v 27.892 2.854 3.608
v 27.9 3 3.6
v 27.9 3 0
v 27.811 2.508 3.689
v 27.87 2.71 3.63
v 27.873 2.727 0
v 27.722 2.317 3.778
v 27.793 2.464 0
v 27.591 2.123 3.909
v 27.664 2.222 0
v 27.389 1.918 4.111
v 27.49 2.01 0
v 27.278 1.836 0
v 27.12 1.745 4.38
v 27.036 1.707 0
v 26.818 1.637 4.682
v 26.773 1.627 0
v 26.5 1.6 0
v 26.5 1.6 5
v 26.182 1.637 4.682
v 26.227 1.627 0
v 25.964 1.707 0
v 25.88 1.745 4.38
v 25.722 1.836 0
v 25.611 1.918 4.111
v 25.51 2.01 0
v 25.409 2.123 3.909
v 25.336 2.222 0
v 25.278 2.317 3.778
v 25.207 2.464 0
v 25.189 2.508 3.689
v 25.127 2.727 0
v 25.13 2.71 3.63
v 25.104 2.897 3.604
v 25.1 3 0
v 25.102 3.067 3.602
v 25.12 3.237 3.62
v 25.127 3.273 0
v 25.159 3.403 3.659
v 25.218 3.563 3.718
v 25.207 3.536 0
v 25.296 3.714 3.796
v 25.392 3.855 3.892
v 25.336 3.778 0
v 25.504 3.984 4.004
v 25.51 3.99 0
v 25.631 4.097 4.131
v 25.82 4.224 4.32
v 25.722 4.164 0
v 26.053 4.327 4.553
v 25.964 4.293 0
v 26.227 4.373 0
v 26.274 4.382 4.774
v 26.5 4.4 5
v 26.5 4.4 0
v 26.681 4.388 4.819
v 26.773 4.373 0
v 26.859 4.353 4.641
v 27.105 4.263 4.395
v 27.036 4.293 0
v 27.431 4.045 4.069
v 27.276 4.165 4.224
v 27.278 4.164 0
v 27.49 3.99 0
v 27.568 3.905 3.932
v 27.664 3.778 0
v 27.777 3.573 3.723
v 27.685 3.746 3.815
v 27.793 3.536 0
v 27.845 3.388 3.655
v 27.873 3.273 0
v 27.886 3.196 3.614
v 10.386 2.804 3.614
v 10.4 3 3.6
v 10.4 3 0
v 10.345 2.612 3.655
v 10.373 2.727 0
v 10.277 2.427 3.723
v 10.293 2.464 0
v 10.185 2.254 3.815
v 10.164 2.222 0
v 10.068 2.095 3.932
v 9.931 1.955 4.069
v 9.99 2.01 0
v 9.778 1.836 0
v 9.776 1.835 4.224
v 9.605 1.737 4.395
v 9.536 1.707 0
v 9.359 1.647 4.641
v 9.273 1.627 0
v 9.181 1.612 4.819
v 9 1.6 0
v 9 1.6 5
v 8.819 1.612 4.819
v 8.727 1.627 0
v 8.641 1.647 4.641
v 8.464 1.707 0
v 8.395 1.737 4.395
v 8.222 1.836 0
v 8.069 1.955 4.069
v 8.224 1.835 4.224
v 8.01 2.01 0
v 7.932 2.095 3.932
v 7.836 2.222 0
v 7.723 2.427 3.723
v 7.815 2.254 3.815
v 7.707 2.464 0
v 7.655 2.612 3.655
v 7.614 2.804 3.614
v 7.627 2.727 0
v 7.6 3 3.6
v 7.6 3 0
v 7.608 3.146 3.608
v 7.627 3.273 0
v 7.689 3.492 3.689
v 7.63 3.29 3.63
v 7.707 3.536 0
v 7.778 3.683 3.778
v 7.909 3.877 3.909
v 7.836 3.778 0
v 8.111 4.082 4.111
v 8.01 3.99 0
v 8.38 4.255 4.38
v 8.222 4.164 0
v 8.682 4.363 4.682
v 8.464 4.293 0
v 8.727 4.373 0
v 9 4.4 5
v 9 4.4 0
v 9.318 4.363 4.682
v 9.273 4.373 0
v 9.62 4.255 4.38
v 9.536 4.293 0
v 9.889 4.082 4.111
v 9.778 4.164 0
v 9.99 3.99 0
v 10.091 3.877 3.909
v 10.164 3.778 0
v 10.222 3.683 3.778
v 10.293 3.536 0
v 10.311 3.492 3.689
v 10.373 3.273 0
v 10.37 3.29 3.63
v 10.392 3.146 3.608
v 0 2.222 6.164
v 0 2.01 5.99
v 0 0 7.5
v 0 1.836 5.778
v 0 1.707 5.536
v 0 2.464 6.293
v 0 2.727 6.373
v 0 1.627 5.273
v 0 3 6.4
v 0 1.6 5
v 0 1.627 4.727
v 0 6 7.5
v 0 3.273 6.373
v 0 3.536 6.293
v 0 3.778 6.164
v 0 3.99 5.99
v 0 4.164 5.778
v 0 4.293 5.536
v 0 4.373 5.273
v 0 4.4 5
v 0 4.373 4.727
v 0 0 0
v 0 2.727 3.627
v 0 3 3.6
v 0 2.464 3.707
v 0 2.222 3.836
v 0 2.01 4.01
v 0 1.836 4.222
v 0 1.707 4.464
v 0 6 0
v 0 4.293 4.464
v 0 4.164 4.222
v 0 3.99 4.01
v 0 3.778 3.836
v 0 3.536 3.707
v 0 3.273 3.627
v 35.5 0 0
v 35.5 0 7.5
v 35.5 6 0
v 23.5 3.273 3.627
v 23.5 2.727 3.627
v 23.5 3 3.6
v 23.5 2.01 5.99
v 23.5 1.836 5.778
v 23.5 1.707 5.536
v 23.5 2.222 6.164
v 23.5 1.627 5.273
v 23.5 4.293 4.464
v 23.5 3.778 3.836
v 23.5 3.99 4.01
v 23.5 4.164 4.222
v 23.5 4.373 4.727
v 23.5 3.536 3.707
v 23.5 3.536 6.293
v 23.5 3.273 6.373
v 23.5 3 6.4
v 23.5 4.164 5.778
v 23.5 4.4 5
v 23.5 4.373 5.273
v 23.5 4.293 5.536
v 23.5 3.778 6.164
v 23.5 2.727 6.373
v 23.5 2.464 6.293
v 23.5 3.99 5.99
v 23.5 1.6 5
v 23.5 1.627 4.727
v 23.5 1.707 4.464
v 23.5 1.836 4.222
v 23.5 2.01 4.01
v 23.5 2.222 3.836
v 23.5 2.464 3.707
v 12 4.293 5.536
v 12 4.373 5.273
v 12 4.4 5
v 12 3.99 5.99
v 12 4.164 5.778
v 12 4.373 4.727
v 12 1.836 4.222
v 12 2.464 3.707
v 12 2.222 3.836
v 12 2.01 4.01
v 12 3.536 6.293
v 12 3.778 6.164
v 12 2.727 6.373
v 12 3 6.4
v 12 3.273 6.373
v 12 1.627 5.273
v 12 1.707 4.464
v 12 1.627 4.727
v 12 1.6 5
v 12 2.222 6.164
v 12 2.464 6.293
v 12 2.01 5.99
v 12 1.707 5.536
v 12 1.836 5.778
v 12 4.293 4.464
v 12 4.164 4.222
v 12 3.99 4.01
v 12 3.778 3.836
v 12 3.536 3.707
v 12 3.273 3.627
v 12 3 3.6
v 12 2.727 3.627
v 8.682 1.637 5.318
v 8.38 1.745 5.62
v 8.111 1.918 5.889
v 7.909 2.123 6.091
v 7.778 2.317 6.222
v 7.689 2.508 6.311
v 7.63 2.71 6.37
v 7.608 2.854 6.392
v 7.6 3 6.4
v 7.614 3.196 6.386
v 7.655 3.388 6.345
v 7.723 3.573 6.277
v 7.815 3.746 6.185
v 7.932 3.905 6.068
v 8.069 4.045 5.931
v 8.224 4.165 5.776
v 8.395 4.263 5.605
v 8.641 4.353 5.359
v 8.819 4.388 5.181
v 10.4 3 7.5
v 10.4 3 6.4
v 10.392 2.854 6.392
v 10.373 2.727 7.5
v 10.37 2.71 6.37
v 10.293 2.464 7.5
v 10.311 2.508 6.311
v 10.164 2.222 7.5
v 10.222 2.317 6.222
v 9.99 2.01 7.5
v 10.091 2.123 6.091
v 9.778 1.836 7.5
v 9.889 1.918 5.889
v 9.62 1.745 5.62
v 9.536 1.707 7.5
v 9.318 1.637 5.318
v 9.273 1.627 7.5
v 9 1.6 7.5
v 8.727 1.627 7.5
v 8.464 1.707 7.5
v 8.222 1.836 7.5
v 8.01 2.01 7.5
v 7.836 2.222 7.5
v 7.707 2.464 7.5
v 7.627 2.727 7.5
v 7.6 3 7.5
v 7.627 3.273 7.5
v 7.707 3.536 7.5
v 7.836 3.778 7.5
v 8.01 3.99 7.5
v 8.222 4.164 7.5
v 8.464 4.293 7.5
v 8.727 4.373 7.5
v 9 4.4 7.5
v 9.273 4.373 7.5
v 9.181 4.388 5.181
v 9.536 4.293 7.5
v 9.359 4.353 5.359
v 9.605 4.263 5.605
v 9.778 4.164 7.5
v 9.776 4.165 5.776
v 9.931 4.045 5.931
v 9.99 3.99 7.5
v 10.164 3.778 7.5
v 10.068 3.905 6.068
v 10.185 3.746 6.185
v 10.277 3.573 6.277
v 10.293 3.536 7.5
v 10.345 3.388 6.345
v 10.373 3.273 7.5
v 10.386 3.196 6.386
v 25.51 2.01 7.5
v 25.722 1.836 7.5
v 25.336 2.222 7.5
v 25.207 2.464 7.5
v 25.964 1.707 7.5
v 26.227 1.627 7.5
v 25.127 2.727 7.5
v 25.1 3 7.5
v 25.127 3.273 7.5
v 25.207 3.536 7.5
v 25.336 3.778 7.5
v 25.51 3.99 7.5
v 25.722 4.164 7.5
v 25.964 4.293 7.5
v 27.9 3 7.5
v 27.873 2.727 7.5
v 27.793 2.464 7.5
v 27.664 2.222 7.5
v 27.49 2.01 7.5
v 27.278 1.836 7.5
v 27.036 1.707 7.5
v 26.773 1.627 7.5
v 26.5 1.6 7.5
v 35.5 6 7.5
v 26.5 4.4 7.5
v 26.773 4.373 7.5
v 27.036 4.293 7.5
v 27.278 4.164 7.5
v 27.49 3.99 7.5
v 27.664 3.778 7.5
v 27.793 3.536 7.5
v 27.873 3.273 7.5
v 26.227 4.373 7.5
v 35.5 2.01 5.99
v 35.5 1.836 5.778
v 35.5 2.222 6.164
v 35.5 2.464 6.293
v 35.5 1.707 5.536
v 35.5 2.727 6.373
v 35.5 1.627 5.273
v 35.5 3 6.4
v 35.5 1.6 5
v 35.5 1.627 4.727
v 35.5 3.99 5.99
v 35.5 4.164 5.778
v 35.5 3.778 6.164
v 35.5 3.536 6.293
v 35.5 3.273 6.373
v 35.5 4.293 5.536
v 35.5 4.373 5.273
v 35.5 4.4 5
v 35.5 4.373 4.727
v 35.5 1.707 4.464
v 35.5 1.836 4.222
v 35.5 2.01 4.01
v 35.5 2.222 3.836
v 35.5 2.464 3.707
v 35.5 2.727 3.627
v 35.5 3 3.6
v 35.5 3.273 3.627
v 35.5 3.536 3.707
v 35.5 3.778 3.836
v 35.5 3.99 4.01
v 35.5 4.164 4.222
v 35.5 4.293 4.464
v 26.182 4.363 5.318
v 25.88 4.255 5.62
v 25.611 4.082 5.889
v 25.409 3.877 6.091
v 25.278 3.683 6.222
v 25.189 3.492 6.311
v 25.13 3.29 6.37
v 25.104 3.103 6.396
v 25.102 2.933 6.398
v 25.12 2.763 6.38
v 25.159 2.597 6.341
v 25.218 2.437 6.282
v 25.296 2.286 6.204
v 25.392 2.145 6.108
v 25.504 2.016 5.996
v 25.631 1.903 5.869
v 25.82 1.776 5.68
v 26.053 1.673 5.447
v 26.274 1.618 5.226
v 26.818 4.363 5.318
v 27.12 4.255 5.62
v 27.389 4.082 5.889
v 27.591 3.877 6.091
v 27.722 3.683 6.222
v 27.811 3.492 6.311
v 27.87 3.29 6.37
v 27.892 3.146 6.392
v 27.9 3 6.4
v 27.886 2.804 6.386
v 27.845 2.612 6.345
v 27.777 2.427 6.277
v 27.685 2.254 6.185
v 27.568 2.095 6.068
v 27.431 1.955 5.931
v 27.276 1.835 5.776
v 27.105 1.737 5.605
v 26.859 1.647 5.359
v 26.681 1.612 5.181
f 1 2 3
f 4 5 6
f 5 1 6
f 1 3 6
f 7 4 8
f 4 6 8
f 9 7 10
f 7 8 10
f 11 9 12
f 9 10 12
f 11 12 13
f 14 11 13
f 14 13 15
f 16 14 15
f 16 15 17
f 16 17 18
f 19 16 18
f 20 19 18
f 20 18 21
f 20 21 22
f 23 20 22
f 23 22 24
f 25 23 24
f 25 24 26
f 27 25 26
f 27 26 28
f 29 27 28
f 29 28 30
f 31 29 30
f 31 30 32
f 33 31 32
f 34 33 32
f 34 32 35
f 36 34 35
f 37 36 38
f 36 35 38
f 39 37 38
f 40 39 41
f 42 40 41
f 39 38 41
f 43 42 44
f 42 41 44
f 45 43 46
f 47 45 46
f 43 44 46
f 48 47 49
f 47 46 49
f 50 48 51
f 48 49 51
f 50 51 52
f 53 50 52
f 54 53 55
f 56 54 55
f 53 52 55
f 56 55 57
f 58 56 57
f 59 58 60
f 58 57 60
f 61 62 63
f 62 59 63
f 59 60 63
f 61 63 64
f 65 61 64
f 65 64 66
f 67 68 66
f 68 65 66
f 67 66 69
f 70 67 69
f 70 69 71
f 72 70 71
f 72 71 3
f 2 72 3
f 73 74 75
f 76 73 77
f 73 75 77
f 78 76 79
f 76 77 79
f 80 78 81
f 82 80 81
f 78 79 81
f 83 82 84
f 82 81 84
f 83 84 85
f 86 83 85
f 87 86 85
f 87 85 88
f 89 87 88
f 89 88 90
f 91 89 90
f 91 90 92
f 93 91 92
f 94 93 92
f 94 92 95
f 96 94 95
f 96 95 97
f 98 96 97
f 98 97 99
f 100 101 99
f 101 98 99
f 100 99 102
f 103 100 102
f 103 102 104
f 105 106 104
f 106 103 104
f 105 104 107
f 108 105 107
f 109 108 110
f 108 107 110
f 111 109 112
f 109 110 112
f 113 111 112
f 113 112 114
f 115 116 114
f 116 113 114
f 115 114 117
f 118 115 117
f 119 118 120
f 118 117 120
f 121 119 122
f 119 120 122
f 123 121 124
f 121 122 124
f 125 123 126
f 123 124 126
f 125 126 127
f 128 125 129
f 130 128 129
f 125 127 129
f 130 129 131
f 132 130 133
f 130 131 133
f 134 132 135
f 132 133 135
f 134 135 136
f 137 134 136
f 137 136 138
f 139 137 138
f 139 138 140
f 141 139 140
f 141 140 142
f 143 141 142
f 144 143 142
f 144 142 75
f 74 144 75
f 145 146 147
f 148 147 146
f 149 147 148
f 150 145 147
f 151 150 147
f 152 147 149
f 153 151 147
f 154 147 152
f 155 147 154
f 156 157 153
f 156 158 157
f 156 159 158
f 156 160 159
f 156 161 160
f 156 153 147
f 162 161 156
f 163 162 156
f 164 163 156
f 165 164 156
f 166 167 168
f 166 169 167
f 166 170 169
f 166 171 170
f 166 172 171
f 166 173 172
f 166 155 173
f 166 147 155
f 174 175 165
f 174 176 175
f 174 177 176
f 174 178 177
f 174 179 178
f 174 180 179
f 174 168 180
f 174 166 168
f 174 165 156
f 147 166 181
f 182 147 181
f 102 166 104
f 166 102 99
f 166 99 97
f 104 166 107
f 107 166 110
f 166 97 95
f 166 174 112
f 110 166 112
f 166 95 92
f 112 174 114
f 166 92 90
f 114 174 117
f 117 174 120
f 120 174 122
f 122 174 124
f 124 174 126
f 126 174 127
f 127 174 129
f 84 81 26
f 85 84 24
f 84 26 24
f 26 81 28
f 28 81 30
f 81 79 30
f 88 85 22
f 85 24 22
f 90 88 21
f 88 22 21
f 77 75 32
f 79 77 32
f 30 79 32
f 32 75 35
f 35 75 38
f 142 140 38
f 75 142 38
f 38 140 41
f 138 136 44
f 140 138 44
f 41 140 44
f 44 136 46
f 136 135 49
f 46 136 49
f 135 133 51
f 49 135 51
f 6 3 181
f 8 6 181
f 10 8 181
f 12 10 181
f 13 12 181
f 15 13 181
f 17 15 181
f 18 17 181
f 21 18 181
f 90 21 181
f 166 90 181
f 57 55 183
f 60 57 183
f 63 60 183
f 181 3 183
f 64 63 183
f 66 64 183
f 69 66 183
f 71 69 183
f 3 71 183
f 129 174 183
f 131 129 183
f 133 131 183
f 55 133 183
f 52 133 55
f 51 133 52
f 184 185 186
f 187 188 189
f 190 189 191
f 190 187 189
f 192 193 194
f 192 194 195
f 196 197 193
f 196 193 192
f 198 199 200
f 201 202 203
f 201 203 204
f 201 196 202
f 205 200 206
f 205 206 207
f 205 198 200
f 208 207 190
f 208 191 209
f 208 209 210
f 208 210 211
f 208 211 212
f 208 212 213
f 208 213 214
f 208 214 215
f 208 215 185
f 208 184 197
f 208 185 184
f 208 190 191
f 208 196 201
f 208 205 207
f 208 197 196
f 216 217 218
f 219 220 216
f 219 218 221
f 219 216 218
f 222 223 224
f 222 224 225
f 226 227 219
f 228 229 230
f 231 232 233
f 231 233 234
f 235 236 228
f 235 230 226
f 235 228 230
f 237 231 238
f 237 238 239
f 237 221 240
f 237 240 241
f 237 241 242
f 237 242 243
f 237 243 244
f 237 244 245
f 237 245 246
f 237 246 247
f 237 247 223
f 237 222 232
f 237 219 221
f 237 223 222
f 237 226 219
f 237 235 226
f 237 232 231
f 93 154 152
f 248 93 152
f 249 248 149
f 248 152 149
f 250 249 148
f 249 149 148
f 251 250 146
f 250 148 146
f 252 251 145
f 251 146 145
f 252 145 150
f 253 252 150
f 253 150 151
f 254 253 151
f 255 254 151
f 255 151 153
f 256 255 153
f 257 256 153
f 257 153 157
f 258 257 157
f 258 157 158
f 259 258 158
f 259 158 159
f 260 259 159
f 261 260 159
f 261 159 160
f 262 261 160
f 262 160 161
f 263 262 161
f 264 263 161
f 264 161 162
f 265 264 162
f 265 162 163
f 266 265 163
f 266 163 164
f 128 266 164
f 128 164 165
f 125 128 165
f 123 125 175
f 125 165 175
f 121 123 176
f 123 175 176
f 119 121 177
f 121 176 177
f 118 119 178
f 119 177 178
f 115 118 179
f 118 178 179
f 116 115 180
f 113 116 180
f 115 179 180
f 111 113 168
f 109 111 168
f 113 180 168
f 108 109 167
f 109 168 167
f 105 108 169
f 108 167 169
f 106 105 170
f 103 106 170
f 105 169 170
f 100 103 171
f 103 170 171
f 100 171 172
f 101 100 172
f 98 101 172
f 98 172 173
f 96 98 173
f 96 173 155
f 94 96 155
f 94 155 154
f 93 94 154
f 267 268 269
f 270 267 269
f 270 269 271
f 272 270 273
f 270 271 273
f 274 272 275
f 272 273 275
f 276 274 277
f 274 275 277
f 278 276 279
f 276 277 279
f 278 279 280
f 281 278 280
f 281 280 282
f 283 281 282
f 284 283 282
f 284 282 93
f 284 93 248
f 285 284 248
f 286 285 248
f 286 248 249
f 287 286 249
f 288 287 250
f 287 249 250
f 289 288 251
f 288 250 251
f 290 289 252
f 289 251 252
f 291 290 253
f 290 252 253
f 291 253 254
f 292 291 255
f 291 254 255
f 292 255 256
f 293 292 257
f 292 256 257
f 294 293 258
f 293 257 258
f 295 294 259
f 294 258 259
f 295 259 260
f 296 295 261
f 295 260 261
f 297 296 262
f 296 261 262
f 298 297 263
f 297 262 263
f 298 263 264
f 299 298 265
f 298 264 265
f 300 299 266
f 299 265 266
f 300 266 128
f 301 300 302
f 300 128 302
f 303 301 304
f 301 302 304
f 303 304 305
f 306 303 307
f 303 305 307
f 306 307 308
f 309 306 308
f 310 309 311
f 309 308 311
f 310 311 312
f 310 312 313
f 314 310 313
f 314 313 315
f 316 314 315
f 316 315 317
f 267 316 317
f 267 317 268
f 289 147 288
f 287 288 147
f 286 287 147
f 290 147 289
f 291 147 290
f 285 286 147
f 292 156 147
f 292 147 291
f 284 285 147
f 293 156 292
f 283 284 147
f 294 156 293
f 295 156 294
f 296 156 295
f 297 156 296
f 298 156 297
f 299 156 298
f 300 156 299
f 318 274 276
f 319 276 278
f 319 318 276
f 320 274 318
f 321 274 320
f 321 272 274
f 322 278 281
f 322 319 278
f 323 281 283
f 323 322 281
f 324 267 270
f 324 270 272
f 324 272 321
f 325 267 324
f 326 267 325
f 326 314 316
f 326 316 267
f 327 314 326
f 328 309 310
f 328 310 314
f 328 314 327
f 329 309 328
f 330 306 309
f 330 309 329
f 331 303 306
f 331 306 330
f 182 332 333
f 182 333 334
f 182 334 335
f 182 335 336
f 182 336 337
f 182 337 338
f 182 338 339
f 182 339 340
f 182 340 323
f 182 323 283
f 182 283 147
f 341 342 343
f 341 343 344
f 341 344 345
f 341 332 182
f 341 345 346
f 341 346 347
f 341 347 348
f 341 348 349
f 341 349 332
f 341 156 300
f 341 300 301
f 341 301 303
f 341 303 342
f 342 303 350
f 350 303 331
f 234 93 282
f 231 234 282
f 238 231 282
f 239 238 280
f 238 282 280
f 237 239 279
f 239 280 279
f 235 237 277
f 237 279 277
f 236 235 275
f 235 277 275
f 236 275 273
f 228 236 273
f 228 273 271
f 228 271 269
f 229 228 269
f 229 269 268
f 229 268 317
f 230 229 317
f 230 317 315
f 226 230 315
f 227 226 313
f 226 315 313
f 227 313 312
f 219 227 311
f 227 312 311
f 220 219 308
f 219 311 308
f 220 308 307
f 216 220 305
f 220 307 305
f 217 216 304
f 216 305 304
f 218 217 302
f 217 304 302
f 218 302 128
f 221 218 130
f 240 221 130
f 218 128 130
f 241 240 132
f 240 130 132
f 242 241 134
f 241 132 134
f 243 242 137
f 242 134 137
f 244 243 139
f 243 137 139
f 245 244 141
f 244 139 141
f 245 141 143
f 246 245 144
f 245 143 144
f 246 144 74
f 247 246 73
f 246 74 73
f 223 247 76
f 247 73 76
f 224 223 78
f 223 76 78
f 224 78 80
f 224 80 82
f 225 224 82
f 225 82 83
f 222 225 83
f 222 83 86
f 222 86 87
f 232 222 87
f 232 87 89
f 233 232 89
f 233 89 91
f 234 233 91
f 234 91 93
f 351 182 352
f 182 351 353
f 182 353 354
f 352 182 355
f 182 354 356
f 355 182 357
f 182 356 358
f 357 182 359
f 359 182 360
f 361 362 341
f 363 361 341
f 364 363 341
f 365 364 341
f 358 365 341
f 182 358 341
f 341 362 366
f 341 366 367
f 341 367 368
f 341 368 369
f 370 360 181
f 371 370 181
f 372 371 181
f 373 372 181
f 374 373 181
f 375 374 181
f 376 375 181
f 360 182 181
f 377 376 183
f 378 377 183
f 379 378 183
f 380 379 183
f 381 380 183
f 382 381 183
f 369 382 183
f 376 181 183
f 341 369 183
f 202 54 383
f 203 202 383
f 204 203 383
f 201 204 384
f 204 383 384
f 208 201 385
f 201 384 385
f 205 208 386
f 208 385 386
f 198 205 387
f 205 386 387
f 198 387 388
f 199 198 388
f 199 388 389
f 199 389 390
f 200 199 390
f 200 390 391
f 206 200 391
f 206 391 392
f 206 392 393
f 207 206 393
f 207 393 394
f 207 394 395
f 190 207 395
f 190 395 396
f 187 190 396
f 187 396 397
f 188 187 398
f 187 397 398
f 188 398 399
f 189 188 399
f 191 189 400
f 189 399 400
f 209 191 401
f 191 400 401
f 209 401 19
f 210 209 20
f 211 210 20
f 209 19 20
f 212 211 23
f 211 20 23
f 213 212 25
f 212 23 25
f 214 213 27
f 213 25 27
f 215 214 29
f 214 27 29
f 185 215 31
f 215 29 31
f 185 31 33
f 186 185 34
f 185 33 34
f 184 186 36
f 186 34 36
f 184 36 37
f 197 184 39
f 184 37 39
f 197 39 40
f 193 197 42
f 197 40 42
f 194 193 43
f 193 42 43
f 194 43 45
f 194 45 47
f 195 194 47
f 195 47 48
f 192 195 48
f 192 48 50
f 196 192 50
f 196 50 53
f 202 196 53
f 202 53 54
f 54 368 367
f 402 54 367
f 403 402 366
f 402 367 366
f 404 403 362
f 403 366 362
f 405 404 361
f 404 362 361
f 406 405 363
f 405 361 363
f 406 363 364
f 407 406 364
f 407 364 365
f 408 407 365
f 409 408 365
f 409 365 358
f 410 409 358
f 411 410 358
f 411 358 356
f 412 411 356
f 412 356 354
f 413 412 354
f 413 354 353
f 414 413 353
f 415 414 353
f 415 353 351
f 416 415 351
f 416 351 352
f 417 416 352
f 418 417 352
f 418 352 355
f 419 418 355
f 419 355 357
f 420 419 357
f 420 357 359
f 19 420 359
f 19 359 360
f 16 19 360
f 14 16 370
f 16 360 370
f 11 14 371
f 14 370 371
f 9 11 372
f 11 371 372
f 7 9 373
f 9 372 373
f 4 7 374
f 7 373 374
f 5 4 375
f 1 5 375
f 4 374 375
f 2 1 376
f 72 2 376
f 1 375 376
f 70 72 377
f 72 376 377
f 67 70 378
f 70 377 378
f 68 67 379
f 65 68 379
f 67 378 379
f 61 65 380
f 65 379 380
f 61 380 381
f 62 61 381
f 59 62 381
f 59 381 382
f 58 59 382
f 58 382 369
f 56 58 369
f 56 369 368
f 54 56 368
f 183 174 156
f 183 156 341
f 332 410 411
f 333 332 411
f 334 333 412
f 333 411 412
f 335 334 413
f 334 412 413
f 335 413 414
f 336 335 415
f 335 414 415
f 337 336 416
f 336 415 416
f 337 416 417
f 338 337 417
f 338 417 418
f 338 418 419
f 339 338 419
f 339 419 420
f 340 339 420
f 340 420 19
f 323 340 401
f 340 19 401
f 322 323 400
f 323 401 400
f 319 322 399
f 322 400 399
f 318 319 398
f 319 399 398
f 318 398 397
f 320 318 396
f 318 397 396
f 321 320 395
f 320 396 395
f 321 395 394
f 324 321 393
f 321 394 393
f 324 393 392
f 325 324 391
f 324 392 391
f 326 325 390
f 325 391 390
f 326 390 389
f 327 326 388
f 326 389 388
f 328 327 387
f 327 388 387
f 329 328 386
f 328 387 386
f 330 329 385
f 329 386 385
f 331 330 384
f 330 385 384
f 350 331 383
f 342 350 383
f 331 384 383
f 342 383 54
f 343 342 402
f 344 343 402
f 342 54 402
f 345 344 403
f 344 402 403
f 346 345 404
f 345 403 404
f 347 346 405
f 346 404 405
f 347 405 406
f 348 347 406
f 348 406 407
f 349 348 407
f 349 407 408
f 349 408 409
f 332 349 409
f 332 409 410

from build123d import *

# Parameters (mm, degrees)
F0_W     = 35.5
F0_H     = 6
F1_DEPTH = 7.5
F2_R     = 1.4
F3_DEPTH = 12
F4_R     = 1.4
F5_DEPTH = 12
F6_R     = 1.4
F7_DEPTH = 7.5


with BuildPart() as f1:
    # F0 (on Top) → F1 (new body)
    with BuildSketch(Plane.XY):
        with Locations((17.75, 3)):
            Rectangle(F0_W, F0_H)
    extrude(amount=F1_DEPTH)

    # F2 (on face) → F3 (cut)
    with BuildSketch(Plane.YZ.offset(35.5)):
        with Locations((3, 5)):
            Circle(F2_R)
    extrude(amount=-F3_DEPTH, mode=Mode.SUBTRACT)

    # F4 (on face) → F5 (cut)
    with BuildSketch(Plane(origin=(0, 0, 0), x_dir=(0, -1, 0), z_dir=(-1, 0, 0))):
        with Locations((-3, 5)):
            Circle(F4_R)
    extrude(amount=-F5_DEPTH, mode=Mode.SUBTRACT)

    # F6 (on face) → F7 (cut, through all)
    with BuildSketch(Plane(origin=(0, 0, 0), x_dir=(1, 0, 0), z_dir=(0, 0, -1))):
        with Locations((9, -3)):
            Circle(F6_R)
        with Locations((26.5, -3)):
            Circle(F6_R)
    extrude(amount=-F7_DEPTH, mode=Mode.SUBTRACT)


solid = f1.part
